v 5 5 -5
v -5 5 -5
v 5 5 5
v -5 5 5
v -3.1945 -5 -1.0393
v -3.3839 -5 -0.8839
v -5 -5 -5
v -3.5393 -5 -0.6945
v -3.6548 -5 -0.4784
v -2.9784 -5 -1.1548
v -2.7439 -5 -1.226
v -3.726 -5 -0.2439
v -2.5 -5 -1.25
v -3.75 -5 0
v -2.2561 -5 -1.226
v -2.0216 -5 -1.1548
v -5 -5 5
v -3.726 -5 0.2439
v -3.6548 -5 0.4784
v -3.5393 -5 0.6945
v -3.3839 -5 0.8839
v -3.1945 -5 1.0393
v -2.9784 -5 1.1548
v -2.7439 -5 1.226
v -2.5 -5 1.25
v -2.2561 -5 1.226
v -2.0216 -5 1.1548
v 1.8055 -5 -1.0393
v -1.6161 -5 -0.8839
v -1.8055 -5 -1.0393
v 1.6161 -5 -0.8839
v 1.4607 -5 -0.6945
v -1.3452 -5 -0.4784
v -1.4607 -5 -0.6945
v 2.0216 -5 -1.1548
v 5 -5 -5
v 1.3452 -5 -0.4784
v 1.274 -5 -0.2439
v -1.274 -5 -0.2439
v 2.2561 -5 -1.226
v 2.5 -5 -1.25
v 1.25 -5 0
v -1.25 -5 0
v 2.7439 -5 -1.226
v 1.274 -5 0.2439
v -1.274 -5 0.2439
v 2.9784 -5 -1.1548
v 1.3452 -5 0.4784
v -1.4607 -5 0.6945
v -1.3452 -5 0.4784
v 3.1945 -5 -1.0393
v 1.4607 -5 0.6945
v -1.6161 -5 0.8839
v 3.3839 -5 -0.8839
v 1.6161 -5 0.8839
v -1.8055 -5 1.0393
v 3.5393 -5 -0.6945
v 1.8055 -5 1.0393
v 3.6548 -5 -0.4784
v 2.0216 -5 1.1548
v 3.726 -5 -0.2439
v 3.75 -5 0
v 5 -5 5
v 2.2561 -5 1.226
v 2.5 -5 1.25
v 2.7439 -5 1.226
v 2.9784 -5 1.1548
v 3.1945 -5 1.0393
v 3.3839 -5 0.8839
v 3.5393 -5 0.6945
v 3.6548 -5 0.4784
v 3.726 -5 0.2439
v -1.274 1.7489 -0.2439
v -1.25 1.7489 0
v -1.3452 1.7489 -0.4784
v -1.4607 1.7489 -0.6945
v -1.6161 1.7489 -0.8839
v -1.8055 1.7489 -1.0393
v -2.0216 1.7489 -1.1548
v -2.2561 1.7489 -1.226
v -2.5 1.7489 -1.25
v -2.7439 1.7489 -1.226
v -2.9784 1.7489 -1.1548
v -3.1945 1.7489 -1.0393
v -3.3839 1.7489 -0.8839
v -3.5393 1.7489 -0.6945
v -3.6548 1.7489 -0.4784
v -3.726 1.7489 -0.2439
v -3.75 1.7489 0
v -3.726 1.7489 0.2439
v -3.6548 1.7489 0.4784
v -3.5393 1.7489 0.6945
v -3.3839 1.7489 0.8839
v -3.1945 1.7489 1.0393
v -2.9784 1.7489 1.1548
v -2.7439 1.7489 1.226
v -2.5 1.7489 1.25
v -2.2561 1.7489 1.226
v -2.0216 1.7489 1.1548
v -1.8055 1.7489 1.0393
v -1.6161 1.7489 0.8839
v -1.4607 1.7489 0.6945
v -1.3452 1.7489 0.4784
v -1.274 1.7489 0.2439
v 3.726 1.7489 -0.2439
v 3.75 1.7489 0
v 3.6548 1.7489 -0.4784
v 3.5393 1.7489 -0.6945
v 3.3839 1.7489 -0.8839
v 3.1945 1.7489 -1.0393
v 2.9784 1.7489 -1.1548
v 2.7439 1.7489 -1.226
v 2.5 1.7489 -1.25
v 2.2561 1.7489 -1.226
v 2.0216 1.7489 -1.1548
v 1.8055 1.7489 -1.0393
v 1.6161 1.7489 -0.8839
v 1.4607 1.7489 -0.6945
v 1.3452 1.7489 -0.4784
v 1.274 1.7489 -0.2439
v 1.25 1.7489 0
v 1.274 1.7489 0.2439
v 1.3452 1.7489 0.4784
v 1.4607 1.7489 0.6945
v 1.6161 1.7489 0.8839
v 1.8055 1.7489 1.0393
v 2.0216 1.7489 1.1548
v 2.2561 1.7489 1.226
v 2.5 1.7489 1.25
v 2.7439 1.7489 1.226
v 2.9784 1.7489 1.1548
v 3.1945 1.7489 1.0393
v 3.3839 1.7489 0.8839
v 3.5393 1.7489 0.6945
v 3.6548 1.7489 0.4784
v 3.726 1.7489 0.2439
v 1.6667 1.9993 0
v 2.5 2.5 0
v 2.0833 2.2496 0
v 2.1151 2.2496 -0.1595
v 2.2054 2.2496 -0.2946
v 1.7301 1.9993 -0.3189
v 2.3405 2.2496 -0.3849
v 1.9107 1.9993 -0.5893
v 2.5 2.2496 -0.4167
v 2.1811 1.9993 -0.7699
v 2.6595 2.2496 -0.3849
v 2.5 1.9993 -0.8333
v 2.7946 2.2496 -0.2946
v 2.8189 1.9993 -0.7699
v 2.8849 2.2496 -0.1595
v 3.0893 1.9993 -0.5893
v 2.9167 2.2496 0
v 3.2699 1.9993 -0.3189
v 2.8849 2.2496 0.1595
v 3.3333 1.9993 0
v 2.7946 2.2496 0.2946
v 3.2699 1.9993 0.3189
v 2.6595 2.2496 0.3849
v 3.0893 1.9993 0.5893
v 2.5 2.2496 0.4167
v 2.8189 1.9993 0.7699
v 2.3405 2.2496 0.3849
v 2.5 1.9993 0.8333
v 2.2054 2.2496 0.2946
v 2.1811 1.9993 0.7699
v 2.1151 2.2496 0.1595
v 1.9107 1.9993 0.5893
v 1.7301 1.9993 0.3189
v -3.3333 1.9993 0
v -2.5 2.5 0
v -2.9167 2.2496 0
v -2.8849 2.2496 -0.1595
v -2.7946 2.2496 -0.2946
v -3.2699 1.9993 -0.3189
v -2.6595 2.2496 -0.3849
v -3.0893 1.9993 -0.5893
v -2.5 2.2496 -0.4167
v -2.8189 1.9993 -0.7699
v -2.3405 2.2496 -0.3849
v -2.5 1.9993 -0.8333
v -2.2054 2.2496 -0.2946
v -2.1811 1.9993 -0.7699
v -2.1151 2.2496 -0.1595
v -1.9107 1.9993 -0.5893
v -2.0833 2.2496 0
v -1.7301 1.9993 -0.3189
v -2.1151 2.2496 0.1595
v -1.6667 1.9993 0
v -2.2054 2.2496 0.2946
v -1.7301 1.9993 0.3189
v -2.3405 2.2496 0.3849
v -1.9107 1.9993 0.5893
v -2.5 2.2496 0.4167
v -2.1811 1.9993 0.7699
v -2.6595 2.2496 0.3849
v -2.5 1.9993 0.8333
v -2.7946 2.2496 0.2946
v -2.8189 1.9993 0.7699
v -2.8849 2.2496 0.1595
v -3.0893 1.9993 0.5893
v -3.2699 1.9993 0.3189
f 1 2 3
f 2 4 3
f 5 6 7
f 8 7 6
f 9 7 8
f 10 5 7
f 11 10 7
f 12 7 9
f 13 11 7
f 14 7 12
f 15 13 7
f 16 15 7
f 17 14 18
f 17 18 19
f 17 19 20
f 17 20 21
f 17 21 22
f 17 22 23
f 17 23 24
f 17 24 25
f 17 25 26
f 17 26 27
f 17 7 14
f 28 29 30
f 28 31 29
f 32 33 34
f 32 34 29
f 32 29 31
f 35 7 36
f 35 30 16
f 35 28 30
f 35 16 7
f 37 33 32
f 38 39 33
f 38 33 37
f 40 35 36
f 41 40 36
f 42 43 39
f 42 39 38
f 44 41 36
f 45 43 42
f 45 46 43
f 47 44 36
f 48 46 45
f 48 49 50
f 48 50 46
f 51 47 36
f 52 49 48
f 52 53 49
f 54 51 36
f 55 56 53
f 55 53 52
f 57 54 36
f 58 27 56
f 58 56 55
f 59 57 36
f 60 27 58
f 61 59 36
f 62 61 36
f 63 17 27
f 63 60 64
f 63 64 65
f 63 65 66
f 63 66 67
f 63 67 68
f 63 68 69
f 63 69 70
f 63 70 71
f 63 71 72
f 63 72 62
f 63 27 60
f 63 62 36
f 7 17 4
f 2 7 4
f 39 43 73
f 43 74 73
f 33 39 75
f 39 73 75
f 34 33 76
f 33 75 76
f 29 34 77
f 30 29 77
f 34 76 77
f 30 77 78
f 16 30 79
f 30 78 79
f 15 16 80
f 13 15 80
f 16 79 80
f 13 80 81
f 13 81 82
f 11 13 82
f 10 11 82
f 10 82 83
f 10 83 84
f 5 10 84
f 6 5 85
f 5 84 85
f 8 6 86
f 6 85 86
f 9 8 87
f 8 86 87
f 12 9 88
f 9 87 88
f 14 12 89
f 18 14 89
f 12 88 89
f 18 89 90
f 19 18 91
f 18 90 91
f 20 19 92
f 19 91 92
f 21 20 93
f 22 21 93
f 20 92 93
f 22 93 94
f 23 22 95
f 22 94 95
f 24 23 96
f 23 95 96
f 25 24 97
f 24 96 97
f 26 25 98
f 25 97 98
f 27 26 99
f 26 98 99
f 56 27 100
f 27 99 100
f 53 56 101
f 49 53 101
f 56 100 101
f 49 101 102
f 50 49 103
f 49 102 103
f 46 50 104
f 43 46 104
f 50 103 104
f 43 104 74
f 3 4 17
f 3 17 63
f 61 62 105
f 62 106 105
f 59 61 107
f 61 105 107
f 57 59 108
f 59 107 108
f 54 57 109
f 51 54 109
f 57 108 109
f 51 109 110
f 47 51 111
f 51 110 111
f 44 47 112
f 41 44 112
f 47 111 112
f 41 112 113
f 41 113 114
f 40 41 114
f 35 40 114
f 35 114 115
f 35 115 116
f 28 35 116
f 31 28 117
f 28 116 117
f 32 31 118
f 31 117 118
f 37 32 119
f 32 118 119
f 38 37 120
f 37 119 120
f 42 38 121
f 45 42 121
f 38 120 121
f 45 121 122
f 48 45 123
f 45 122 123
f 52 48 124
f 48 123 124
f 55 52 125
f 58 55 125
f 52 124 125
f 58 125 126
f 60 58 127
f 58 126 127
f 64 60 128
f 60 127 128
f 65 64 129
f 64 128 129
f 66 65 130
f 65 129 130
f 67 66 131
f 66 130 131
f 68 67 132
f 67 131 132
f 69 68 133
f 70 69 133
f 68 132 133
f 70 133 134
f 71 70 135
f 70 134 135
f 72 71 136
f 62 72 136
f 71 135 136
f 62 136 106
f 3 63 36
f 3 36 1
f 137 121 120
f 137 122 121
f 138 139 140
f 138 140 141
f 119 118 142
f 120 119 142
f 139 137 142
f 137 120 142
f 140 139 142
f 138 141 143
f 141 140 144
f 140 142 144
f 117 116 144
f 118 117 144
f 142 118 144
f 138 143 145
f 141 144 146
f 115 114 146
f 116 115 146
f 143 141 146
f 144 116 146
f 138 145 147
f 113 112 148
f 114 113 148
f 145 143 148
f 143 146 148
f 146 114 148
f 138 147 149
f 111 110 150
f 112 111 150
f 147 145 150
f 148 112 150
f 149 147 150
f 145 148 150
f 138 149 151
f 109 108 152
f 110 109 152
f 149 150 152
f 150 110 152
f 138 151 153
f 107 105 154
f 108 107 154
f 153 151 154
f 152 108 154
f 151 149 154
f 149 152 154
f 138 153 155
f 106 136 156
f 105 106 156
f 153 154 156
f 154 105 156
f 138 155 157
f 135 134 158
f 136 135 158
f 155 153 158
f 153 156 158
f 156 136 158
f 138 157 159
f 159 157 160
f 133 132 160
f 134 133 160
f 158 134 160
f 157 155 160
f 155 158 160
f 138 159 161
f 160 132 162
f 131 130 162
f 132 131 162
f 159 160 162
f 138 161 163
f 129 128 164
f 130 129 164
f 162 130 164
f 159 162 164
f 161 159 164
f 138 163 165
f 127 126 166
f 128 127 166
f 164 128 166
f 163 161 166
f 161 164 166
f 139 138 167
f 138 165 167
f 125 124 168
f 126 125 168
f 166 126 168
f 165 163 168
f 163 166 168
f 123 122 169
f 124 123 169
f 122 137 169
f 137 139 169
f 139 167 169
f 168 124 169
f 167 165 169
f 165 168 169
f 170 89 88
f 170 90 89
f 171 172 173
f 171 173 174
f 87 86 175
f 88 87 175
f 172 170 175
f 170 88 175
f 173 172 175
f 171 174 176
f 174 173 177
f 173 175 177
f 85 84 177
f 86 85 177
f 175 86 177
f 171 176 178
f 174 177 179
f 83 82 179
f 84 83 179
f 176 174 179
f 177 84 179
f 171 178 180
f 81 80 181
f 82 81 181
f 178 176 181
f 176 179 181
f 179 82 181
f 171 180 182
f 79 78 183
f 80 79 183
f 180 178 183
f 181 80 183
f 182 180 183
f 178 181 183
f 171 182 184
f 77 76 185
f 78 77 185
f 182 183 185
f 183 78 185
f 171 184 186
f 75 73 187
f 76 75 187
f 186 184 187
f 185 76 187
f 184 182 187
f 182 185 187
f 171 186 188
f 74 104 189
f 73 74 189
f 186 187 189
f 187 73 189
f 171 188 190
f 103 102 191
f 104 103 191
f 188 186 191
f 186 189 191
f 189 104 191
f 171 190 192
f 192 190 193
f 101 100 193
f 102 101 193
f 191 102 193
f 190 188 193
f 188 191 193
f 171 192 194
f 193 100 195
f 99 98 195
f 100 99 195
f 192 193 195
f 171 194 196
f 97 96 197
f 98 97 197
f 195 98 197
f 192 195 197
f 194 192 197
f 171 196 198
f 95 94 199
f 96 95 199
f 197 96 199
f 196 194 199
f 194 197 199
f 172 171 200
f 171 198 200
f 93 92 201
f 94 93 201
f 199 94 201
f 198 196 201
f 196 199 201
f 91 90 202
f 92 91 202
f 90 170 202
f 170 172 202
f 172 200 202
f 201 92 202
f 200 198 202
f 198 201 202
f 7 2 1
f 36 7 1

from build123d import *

# Parameters (mm, degrees)
SKETCH1_W                 = 10
SKETCH1_H                 = 10
BOSS_EXTRUDE1_DEPTH       = 5
M3X0_5_TAPPED_HOLE1_D     = 2.5
M3X0_5_TAPPED_HOLE1_DEPTH = 6.748924226
M3X0_5_TAPPED_HOLE1_TIP   = 0.751075774


with BuildPart() as part:
    # Sketch1 → Boss-Extrude1 (new body, symmetric)
    with BuildSketch(Plane.XY):
        Rectangle(SKETCH1_W, SKETCH1_H)
    extrude(amount=BOSS_EXTRUDE1_DEPTH, both=True)

    # M3x0.5 Tapped Hole1
    with Locations(Plane(origin=(0, -5, 0), x_dir=(-1, 0, 0), z_dir=(0, -1, 0))):
        with Locations((-2.5, 0), (2.5, 0)):
            Hole(M3X0_5_TAPPED_HOLE1_D / 2, depth=M3X0_5_TAPPED_HOLE1_DEPTH)
            with Locations((0, 0, -(M3X0_5_TAPPED_HOLE1_DEPTH + M3X0_5_TAPPED_HOLE1_TIP / 2))):  # 118° drill point
                Cone(0, M3X0_5_TAPPED_HOLE1_D / 2, M3X0_5_TAPPED_HOLE1_TIP, mode=Mode.SUBTRACT)


solid = part.part
